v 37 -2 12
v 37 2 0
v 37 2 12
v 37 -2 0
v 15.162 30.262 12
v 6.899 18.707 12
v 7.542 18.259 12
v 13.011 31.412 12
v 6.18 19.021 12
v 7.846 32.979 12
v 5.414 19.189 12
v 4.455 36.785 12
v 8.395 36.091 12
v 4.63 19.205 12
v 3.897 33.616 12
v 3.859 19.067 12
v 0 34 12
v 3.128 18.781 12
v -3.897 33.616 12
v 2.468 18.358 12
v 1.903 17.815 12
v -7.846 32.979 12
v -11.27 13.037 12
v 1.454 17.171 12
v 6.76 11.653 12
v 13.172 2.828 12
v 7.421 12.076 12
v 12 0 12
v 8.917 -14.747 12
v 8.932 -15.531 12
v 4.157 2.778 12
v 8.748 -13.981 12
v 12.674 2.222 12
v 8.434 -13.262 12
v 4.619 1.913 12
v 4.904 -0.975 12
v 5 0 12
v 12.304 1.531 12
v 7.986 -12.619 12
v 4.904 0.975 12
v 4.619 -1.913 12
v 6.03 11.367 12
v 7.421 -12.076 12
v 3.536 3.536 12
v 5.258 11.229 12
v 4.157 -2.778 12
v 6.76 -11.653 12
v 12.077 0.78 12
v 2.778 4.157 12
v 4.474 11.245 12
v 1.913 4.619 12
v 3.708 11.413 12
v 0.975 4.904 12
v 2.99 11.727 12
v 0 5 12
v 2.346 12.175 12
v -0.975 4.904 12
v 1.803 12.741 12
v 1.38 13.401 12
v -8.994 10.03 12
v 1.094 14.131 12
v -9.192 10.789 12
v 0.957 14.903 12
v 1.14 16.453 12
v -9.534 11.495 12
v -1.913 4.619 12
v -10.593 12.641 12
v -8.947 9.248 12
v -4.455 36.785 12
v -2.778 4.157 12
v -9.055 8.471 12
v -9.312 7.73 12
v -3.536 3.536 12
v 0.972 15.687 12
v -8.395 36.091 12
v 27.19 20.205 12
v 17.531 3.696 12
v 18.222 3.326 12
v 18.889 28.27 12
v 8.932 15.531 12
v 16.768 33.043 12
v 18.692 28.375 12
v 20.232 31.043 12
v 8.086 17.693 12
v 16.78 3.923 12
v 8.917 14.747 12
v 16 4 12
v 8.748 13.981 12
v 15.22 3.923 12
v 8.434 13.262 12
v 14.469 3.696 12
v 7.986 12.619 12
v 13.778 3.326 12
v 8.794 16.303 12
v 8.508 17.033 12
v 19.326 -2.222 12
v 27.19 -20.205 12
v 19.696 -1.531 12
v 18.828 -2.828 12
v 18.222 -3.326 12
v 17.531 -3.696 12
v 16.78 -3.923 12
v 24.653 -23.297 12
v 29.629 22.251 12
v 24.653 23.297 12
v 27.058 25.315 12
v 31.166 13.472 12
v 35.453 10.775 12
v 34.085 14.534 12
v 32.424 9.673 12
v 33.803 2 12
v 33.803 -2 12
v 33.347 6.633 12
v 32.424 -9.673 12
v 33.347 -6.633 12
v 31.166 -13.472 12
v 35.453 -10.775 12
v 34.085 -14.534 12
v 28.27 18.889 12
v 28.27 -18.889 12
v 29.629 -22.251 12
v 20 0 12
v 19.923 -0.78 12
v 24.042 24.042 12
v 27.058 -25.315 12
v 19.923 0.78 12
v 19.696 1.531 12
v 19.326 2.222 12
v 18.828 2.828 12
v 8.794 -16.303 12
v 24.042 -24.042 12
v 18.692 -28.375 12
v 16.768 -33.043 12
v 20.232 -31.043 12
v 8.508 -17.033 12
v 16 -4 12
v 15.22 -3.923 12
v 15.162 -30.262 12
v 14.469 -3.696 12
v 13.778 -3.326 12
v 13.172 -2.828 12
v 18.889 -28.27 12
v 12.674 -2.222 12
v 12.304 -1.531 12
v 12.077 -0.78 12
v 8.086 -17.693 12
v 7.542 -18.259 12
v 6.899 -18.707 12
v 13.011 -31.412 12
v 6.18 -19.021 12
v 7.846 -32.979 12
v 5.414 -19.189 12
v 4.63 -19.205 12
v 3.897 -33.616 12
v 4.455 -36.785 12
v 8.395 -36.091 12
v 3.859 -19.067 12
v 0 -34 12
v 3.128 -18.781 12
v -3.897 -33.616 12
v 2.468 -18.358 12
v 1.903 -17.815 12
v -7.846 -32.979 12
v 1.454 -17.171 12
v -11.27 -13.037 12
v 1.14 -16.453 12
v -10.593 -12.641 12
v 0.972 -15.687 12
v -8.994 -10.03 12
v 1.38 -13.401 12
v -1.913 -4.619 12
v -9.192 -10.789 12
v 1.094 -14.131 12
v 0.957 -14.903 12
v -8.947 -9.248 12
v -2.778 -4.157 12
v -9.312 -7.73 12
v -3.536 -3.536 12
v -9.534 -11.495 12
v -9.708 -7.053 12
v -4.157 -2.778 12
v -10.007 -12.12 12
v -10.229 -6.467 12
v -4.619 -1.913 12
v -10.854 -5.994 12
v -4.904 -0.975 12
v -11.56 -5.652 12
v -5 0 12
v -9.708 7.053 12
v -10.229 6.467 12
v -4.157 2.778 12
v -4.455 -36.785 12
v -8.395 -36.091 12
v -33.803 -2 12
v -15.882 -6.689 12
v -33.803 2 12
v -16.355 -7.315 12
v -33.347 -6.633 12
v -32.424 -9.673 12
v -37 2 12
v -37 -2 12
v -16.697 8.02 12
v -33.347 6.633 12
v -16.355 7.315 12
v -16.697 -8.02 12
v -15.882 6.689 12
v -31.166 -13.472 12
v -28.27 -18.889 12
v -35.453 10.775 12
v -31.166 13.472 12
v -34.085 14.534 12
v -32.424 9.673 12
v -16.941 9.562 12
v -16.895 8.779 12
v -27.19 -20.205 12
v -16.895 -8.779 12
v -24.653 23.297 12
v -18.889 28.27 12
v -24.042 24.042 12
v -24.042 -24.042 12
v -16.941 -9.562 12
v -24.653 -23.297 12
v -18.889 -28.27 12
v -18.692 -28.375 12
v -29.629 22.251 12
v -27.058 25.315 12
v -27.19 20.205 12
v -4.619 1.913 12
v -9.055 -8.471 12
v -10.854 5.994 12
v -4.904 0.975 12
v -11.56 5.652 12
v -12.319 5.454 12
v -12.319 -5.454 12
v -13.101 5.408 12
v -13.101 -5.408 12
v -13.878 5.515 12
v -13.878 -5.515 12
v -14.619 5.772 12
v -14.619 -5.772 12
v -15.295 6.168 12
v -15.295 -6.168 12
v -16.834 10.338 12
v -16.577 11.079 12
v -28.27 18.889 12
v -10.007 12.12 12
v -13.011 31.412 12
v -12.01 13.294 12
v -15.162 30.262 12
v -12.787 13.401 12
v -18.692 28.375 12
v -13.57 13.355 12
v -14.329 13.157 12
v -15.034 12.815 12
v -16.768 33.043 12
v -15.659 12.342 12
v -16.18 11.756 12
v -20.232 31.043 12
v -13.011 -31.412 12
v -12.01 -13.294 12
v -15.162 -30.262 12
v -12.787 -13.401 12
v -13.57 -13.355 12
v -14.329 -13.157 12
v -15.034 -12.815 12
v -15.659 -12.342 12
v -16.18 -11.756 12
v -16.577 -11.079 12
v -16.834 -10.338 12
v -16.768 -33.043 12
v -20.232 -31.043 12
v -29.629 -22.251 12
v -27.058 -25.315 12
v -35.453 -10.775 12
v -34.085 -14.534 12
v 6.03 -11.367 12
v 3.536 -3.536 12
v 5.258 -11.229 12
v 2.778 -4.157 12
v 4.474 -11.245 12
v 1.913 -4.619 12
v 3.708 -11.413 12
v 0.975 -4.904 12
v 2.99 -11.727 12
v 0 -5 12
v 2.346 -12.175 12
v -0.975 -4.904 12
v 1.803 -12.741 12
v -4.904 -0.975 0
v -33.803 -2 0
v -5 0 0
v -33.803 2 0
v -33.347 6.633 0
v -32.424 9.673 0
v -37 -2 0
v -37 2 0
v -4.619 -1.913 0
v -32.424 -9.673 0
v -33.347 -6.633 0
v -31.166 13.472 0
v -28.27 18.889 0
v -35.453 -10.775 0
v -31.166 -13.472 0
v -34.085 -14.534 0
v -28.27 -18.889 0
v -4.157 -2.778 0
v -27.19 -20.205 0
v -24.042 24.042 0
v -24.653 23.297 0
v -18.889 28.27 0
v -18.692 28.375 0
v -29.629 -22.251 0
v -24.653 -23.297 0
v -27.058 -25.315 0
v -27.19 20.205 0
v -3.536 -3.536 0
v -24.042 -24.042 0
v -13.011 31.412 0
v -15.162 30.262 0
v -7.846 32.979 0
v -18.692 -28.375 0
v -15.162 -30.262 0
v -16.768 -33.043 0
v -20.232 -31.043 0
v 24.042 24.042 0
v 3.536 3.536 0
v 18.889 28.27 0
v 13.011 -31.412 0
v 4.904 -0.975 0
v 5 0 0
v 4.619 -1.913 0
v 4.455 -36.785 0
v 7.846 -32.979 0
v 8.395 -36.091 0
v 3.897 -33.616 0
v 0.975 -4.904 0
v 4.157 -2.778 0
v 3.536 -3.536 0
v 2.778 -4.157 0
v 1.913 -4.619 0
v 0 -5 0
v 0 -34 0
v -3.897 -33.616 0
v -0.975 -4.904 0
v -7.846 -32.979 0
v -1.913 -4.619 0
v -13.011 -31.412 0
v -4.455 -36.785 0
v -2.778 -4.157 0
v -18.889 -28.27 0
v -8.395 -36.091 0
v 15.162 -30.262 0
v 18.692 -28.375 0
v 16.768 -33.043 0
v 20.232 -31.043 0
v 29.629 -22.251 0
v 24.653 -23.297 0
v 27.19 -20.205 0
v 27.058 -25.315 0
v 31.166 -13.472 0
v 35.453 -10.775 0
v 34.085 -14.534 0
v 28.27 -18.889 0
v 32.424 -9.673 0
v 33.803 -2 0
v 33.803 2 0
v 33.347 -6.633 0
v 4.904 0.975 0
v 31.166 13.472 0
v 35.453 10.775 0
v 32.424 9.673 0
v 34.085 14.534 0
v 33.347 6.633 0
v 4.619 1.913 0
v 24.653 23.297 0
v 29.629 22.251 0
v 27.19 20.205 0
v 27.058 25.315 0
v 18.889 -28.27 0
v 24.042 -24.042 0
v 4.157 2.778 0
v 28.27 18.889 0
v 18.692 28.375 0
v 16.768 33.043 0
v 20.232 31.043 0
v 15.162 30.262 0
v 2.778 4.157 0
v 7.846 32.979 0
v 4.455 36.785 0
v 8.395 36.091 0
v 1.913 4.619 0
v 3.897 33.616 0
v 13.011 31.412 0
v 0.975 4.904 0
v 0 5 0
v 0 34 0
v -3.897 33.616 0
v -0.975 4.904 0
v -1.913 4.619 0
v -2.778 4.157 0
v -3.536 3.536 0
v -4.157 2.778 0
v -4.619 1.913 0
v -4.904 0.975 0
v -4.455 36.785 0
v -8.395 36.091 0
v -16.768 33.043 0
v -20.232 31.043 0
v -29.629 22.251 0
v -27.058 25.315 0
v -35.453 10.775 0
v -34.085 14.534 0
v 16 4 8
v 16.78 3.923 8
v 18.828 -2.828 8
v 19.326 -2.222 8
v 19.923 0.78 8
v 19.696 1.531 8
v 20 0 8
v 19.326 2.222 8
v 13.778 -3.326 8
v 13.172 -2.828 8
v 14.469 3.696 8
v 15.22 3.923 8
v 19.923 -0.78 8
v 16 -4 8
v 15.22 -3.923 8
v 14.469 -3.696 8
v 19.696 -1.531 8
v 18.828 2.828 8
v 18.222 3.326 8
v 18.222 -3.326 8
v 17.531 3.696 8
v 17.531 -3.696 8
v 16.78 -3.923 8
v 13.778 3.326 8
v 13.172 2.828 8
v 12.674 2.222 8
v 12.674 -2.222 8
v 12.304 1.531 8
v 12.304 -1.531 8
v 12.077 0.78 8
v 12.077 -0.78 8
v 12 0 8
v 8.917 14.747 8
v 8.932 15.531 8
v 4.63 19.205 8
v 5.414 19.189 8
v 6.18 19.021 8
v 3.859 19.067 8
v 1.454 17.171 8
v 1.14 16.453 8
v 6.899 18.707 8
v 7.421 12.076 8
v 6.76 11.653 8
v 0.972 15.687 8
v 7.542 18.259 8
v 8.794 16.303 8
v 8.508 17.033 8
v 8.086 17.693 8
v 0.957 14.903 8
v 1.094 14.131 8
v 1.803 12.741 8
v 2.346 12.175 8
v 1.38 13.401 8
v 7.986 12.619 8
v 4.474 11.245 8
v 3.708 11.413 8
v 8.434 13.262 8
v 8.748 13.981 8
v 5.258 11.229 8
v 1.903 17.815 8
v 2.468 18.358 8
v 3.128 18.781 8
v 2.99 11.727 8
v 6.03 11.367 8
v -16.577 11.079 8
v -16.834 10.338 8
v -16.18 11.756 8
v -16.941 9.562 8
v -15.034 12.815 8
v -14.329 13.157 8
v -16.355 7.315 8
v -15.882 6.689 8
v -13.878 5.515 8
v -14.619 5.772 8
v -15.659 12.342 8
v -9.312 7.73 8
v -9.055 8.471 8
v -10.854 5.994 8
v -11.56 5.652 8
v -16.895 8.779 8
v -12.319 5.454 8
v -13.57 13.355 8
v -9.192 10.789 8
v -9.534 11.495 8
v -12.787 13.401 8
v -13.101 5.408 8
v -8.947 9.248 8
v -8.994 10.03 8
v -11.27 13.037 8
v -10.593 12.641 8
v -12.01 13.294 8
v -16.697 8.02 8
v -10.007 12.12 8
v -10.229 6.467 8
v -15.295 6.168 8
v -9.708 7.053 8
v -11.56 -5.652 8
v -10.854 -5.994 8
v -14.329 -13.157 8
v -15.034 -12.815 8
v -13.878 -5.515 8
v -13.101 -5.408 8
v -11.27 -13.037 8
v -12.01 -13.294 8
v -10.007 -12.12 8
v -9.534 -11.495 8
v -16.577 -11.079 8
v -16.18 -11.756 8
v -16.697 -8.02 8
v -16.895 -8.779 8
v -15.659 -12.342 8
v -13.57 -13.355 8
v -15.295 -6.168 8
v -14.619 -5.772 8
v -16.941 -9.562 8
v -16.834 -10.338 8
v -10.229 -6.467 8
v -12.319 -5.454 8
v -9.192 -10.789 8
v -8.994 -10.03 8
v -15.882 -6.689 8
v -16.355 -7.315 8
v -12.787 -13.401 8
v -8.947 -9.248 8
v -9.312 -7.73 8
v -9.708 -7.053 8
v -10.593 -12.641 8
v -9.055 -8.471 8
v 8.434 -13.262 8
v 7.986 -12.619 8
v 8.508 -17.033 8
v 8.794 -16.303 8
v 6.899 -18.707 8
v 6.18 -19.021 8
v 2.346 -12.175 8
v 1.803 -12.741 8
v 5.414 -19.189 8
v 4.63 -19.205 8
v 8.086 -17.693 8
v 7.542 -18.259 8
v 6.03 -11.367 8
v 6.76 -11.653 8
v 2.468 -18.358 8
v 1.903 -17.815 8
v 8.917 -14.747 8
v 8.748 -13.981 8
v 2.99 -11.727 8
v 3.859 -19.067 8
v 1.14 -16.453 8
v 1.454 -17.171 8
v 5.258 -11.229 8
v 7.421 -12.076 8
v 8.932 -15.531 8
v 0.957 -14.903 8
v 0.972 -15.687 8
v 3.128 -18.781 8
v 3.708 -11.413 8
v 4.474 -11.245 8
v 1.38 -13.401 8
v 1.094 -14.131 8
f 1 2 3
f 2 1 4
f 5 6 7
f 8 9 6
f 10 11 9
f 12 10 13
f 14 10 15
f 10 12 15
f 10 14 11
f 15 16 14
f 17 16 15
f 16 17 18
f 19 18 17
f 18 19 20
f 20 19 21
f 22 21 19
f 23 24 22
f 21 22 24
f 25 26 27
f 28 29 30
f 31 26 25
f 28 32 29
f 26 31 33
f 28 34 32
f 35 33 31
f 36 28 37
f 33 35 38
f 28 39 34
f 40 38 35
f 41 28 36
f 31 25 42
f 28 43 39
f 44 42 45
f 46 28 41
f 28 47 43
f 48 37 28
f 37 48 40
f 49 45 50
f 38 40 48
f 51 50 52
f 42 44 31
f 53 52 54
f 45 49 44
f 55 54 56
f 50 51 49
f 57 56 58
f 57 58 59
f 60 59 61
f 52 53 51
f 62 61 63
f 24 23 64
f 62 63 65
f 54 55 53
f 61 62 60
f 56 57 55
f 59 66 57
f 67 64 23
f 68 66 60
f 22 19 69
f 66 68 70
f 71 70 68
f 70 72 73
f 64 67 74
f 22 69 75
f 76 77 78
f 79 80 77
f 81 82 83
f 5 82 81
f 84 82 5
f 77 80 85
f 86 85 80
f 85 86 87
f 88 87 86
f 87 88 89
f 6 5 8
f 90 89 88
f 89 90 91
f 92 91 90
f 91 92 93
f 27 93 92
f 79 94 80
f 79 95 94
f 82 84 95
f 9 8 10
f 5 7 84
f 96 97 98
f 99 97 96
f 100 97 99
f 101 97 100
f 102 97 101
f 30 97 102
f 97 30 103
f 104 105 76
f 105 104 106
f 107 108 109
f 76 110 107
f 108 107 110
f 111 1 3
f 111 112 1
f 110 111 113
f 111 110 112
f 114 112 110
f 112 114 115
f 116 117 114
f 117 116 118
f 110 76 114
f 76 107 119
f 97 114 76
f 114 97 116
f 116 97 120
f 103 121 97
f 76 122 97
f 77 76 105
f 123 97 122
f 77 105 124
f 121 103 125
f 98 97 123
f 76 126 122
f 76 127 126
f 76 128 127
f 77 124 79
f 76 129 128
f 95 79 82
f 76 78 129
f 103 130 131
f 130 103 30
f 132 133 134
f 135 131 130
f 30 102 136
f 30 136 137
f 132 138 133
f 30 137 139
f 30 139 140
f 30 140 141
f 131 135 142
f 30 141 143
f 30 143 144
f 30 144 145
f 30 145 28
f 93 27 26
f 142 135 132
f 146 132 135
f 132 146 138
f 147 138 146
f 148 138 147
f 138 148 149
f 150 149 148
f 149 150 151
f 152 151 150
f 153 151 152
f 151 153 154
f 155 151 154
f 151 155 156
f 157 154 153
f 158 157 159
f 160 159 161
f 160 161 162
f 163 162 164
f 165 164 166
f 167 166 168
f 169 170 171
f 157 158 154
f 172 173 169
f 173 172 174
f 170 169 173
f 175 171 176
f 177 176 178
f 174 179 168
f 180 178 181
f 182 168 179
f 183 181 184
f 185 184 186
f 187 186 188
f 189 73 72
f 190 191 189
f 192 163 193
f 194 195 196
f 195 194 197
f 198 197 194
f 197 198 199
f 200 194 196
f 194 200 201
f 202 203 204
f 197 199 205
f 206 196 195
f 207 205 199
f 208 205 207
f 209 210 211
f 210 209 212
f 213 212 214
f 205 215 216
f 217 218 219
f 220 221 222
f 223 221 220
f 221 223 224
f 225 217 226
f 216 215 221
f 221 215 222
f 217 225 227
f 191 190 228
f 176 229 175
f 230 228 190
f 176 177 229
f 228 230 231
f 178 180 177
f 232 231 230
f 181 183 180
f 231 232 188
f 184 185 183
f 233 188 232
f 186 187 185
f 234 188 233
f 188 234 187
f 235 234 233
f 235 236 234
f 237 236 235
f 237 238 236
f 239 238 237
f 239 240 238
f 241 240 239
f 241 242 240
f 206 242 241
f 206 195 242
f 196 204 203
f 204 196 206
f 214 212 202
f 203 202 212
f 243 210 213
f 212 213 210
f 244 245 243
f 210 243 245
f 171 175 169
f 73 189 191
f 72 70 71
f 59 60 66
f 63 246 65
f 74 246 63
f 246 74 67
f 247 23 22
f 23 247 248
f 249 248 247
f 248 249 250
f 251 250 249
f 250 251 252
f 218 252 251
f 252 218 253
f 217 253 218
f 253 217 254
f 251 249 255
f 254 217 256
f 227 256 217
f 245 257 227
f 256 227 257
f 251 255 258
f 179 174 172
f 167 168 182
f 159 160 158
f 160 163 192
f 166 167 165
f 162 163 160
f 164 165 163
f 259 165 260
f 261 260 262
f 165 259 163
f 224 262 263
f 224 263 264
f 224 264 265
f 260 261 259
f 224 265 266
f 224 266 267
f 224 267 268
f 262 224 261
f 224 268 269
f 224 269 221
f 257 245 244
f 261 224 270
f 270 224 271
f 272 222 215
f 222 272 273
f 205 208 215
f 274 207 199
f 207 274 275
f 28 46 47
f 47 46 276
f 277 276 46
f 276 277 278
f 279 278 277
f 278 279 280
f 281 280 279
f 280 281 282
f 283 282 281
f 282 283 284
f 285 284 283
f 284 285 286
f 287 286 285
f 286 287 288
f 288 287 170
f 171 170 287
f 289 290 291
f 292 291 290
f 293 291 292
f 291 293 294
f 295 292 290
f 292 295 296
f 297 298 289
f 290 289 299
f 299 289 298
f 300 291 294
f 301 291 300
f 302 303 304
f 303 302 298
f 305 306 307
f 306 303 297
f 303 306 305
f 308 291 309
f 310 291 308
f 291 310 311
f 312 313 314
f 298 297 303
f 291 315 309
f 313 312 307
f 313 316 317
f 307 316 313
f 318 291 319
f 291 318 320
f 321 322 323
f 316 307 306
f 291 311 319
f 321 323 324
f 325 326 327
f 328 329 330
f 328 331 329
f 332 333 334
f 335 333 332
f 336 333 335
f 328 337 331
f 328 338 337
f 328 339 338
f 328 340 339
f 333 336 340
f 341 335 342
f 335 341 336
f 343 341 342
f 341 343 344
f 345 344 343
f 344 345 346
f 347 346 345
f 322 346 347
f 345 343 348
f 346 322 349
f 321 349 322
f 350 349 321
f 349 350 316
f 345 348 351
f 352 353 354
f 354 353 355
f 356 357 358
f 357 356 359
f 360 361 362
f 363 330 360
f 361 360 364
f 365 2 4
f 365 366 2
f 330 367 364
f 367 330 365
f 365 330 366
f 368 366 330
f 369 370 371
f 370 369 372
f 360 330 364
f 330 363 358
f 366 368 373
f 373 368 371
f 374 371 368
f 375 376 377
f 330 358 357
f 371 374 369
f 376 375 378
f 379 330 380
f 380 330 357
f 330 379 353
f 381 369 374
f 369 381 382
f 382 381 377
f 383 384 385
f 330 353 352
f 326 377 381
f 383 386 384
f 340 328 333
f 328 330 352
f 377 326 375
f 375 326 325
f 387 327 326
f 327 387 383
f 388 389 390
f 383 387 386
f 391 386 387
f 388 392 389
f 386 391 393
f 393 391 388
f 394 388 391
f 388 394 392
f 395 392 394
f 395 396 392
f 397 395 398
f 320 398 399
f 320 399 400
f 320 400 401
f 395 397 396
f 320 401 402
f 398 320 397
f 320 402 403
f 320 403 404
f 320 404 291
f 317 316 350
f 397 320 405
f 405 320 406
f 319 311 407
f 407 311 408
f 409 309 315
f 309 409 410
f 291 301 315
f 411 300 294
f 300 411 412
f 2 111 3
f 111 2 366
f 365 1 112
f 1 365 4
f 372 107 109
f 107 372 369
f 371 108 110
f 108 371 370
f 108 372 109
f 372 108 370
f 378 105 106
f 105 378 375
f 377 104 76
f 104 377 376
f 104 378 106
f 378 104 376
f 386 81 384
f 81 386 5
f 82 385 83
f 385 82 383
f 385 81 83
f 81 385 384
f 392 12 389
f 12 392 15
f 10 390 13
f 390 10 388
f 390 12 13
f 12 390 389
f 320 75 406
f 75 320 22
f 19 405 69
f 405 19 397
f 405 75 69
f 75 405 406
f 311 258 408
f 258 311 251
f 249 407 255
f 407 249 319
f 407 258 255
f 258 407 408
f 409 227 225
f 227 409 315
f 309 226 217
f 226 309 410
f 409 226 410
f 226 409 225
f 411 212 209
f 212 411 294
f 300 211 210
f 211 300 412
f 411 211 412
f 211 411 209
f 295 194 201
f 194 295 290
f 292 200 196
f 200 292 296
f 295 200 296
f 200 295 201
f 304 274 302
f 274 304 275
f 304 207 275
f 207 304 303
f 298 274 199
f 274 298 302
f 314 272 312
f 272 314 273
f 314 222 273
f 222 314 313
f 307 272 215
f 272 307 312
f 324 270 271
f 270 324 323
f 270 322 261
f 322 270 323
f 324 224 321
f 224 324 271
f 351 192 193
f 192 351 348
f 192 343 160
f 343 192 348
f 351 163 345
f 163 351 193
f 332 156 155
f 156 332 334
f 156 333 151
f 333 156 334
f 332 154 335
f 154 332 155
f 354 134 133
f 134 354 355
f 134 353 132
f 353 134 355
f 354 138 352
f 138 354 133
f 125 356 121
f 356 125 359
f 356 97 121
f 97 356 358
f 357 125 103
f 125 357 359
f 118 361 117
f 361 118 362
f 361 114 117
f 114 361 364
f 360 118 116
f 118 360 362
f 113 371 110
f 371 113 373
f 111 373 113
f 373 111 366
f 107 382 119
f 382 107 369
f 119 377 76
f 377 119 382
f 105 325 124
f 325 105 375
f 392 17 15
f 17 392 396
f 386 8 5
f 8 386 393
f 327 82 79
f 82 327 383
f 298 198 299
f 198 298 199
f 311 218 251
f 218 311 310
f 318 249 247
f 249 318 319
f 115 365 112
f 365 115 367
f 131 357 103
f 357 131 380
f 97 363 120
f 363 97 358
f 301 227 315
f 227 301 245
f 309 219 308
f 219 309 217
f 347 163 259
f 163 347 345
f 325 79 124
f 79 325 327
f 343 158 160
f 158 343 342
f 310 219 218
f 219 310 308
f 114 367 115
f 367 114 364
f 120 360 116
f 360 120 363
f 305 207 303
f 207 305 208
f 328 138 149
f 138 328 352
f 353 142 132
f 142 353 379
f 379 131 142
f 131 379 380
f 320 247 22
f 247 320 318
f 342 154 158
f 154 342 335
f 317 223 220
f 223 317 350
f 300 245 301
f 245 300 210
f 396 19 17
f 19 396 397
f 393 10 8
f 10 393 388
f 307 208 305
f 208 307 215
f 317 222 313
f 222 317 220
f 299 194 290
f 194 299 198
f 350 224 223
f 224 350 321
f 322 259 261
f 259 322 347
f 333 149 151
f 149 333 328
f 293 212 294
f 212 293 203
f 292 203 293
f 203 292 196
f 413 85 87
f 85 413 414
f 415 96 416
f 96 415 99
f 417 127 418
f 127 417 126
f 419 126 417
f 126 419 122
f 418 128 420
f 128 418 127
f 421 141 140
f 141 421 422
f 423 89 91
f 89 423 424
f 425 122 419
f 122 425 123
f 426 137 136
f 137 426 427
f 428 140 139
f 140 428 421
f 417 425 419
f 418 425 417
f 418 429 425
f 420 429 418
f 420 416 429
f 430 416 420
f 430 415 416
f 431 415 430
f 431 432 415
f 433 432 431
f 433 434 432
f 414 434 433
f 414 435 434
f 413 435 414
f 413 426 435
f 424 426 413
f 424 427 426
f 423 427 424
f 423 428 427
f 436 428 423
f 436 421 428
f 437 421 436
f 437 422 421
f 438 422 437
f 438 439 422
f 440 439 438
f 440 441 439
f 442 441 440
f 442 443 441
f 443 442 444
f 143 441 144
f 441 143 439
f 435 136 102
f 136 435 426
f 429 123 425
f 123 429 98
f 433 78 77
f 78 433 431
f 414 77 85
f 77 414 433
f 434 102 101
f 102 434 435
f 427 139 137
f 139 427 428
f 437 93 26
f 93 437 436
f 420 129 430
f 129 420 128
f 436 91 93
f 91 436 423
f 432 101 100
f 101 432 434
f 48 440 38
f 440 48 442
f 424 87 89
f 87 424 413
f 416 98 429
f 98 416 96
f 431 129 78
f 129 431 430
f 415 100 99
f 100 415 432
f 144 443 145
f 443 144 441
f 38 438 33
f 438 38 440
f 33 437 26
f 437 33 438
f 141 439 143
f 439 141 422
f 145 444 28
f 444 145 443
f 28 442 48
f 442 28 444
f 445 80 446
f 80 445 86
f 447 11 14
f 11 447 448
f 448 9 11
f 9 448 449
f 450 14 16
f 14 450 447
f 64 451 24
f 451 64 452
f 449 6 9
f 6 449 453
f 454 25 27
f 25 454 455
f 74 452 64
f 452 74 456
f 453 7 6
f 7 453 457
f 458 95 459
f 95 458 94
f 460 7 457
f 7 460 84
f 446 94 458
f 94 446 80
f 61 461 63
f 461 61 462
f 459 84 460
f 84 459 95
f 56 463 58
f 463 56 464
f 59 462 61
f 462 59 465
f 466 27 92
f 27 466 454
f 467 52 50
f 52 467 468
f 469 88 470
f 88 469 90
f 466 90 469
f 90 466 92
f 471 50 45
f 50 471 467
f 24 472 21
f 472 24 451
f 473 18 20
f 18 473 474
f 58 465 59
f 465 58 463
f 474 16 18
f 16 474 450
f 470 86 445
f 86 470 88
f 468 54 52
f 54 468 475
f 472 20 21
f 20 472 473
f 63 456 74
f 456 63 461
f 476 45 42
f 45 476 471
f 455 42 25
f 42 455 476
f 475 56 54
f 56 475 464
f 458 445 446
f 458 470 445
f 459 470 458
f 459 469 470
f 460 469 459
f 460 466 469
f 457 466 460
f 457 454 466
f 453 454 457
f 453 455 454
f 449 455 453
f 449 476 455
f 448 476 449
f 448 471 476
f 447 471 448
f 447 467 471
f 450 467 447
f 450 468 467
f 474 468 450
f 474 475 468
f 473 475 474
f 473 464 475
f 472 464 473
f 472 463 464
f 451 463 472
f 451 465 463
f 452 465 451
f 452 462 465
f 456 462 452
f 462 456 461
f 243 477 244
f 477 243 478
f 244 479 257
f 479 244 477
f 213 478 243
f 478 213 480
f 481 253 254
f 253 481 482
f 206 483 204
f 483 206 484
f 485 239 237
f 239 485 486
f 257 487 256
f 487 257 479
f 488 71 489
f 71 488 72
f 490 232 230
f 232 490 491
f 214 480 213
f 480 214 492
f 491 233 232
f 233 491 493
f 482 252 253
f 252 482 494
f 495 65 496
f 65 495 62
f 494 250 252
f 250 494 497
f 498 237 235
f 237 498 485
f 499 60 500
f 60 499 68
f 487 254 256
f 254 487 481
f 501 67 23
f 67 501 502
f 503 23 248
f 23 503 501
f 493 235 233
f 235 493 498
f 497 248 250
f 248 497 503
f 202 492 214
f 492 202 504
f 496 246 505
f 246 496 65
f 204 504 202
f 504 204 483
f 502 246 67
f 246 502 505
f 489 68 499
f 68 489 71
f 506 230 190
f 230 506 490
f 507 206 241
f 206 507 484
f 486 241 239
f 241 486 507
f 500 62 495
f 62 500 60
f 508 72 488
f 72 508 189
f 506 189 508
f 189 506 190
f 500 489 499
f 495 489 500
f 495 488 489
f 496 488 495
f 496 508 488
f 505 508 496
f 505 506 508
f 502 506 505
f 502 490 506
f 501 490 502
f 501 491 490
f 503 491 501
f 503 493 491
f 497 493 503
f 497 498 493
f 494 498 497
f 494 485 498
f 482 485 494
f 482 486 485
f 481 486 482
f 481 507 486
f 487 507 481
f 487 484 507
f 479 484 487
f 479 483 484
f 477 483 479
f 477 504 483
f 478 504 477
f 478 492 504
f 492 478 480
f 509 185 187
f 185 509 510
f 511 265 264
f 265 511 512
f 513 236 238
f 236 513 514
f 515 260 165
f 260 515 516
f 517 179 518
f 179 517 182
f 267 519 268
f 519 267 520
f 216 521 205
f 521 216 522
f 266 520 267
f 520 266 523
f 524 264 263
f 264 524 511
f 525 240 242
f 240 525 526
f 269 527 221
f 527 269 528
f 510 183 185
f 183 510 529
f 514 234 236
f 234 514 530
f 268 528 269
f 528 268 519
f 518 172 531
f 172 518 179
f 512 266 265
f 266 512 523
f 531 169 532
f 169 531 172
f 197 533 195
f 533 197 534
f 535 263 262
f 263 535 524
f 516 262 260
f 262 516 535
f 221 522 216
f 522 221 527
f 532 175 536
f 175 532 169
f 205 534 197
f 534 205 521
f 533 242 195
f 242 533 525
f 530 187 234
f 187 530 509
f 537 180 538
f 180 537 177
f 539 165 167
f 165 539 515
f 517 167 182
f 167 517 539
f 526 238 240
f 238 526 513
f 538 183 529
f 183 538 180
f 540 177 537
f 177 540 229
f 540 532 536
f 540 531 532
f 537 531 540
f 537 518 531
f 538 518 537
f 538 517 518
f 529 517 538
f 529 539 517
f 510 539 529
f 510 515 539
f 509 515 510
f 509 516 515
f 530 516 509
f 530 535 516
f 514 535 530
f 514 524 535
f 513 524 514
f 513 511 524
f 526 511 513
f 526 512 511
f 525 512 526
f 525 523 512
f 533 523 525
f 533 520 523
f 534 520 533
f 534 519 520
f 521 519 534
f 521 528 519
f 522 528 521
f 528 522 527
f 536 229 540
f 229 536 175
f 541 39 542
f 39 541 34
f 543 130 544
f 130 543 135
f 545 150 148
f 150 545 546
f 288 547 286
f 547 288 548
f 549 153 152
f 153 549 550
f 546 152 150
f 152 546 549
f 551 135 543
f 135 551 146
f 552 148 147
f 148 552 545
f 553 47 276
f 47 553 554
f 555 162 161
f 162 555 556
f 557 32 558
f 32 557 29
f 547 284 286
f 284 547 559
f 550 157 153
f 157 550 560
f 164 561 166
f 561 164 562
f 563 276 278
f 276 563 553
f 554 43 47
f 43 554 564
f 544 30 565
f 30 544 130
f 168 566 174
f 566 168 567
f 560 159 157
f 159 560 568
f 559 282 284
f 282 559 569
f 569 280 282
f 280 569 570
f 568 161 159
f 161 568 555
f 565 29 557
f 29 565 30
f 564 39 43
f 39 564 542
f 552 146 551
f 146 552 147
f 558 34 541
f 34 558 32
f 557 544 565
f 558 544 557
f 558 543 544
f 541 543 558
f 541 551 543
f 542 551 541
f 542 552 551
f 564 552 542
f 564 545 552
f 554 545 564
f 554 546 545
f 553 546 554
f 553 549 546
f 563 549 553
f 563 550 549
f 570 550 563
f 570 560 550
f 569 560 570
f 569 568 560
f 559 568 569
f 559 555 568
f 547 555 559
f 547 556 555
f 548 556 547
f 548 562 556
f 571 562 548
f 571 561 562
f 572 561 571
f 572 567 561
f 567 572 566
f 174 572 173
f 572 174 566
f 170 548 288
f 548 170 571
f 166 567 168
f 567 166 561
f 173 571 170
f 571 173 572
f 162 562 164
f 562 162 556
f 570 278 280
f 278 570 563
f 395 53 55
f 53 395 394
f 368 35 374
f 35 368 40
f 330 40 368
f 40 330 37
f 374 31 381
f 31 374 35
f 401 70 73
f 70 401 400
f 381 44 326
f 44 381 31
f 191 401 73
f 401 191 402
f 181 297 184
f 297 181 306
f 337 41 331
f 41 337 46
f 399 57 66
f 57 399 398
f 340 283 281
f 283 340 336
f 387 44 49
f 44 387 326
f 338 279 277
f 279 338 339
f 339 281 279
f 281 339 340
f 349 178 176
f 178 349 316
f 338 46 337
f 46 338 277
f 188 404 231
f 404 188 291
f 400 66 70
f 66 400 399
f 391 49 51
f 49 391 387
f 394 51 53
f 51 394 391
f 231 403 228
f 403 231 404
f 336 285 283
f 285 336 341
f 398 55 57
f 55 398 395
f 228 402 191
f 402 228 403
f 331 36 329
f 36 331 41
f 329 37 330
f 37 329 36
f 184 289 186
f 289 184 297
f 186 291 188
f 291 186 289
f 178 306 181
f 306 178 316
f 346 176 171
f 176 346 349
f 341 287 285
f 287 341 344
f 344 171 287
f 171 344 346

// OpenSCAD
$fn = 32;

// ----------------------------------------------------------------------
// Spur blank: lightened gear blank
// ----------------------------------------------------------------------

// --- parameters (mm) ---
disc_r = 34;              // blank root radius
disc_t = 12;              // blank thickness
n_teeth = 18;             // stub tooth count
tooth_w = 4;              // tooth width at the root
tooth_h = 3;              // tooth height above the root
bore_r = 5;               // central bore radius
ring_r = 16;              // lightening pocket ring radius
pocket_r = 4;             // lightening pocket radius

out_r = disc_r + tooth_h;  // tip radius
bbox_x = 74.0;  // measured width over the teeth
bbox_y = 73.57;  // measured depth over the teeth

difference() {
union() {
  cylinder(r = disc_r, h = disc_t);
  for (i = [0 : n_teeth - 1])
    rotate([0, 0, i * 360 / n_teeth])
      translate([disc_r - 1, -tooth_w / 2, 0])
        cube([tooth_h + 1, tooth_w, disc_t]);
}
  translate([0, 0, -1]) cylinder(r = bore_r, h = disc_t + 2);
  for (i = [0 : 5])
    rotate([0, 0, i * 72])
      translate([ring_r, 0, disc_t - 4])
        cylinder(r = pocket_r, h = 5);
}
